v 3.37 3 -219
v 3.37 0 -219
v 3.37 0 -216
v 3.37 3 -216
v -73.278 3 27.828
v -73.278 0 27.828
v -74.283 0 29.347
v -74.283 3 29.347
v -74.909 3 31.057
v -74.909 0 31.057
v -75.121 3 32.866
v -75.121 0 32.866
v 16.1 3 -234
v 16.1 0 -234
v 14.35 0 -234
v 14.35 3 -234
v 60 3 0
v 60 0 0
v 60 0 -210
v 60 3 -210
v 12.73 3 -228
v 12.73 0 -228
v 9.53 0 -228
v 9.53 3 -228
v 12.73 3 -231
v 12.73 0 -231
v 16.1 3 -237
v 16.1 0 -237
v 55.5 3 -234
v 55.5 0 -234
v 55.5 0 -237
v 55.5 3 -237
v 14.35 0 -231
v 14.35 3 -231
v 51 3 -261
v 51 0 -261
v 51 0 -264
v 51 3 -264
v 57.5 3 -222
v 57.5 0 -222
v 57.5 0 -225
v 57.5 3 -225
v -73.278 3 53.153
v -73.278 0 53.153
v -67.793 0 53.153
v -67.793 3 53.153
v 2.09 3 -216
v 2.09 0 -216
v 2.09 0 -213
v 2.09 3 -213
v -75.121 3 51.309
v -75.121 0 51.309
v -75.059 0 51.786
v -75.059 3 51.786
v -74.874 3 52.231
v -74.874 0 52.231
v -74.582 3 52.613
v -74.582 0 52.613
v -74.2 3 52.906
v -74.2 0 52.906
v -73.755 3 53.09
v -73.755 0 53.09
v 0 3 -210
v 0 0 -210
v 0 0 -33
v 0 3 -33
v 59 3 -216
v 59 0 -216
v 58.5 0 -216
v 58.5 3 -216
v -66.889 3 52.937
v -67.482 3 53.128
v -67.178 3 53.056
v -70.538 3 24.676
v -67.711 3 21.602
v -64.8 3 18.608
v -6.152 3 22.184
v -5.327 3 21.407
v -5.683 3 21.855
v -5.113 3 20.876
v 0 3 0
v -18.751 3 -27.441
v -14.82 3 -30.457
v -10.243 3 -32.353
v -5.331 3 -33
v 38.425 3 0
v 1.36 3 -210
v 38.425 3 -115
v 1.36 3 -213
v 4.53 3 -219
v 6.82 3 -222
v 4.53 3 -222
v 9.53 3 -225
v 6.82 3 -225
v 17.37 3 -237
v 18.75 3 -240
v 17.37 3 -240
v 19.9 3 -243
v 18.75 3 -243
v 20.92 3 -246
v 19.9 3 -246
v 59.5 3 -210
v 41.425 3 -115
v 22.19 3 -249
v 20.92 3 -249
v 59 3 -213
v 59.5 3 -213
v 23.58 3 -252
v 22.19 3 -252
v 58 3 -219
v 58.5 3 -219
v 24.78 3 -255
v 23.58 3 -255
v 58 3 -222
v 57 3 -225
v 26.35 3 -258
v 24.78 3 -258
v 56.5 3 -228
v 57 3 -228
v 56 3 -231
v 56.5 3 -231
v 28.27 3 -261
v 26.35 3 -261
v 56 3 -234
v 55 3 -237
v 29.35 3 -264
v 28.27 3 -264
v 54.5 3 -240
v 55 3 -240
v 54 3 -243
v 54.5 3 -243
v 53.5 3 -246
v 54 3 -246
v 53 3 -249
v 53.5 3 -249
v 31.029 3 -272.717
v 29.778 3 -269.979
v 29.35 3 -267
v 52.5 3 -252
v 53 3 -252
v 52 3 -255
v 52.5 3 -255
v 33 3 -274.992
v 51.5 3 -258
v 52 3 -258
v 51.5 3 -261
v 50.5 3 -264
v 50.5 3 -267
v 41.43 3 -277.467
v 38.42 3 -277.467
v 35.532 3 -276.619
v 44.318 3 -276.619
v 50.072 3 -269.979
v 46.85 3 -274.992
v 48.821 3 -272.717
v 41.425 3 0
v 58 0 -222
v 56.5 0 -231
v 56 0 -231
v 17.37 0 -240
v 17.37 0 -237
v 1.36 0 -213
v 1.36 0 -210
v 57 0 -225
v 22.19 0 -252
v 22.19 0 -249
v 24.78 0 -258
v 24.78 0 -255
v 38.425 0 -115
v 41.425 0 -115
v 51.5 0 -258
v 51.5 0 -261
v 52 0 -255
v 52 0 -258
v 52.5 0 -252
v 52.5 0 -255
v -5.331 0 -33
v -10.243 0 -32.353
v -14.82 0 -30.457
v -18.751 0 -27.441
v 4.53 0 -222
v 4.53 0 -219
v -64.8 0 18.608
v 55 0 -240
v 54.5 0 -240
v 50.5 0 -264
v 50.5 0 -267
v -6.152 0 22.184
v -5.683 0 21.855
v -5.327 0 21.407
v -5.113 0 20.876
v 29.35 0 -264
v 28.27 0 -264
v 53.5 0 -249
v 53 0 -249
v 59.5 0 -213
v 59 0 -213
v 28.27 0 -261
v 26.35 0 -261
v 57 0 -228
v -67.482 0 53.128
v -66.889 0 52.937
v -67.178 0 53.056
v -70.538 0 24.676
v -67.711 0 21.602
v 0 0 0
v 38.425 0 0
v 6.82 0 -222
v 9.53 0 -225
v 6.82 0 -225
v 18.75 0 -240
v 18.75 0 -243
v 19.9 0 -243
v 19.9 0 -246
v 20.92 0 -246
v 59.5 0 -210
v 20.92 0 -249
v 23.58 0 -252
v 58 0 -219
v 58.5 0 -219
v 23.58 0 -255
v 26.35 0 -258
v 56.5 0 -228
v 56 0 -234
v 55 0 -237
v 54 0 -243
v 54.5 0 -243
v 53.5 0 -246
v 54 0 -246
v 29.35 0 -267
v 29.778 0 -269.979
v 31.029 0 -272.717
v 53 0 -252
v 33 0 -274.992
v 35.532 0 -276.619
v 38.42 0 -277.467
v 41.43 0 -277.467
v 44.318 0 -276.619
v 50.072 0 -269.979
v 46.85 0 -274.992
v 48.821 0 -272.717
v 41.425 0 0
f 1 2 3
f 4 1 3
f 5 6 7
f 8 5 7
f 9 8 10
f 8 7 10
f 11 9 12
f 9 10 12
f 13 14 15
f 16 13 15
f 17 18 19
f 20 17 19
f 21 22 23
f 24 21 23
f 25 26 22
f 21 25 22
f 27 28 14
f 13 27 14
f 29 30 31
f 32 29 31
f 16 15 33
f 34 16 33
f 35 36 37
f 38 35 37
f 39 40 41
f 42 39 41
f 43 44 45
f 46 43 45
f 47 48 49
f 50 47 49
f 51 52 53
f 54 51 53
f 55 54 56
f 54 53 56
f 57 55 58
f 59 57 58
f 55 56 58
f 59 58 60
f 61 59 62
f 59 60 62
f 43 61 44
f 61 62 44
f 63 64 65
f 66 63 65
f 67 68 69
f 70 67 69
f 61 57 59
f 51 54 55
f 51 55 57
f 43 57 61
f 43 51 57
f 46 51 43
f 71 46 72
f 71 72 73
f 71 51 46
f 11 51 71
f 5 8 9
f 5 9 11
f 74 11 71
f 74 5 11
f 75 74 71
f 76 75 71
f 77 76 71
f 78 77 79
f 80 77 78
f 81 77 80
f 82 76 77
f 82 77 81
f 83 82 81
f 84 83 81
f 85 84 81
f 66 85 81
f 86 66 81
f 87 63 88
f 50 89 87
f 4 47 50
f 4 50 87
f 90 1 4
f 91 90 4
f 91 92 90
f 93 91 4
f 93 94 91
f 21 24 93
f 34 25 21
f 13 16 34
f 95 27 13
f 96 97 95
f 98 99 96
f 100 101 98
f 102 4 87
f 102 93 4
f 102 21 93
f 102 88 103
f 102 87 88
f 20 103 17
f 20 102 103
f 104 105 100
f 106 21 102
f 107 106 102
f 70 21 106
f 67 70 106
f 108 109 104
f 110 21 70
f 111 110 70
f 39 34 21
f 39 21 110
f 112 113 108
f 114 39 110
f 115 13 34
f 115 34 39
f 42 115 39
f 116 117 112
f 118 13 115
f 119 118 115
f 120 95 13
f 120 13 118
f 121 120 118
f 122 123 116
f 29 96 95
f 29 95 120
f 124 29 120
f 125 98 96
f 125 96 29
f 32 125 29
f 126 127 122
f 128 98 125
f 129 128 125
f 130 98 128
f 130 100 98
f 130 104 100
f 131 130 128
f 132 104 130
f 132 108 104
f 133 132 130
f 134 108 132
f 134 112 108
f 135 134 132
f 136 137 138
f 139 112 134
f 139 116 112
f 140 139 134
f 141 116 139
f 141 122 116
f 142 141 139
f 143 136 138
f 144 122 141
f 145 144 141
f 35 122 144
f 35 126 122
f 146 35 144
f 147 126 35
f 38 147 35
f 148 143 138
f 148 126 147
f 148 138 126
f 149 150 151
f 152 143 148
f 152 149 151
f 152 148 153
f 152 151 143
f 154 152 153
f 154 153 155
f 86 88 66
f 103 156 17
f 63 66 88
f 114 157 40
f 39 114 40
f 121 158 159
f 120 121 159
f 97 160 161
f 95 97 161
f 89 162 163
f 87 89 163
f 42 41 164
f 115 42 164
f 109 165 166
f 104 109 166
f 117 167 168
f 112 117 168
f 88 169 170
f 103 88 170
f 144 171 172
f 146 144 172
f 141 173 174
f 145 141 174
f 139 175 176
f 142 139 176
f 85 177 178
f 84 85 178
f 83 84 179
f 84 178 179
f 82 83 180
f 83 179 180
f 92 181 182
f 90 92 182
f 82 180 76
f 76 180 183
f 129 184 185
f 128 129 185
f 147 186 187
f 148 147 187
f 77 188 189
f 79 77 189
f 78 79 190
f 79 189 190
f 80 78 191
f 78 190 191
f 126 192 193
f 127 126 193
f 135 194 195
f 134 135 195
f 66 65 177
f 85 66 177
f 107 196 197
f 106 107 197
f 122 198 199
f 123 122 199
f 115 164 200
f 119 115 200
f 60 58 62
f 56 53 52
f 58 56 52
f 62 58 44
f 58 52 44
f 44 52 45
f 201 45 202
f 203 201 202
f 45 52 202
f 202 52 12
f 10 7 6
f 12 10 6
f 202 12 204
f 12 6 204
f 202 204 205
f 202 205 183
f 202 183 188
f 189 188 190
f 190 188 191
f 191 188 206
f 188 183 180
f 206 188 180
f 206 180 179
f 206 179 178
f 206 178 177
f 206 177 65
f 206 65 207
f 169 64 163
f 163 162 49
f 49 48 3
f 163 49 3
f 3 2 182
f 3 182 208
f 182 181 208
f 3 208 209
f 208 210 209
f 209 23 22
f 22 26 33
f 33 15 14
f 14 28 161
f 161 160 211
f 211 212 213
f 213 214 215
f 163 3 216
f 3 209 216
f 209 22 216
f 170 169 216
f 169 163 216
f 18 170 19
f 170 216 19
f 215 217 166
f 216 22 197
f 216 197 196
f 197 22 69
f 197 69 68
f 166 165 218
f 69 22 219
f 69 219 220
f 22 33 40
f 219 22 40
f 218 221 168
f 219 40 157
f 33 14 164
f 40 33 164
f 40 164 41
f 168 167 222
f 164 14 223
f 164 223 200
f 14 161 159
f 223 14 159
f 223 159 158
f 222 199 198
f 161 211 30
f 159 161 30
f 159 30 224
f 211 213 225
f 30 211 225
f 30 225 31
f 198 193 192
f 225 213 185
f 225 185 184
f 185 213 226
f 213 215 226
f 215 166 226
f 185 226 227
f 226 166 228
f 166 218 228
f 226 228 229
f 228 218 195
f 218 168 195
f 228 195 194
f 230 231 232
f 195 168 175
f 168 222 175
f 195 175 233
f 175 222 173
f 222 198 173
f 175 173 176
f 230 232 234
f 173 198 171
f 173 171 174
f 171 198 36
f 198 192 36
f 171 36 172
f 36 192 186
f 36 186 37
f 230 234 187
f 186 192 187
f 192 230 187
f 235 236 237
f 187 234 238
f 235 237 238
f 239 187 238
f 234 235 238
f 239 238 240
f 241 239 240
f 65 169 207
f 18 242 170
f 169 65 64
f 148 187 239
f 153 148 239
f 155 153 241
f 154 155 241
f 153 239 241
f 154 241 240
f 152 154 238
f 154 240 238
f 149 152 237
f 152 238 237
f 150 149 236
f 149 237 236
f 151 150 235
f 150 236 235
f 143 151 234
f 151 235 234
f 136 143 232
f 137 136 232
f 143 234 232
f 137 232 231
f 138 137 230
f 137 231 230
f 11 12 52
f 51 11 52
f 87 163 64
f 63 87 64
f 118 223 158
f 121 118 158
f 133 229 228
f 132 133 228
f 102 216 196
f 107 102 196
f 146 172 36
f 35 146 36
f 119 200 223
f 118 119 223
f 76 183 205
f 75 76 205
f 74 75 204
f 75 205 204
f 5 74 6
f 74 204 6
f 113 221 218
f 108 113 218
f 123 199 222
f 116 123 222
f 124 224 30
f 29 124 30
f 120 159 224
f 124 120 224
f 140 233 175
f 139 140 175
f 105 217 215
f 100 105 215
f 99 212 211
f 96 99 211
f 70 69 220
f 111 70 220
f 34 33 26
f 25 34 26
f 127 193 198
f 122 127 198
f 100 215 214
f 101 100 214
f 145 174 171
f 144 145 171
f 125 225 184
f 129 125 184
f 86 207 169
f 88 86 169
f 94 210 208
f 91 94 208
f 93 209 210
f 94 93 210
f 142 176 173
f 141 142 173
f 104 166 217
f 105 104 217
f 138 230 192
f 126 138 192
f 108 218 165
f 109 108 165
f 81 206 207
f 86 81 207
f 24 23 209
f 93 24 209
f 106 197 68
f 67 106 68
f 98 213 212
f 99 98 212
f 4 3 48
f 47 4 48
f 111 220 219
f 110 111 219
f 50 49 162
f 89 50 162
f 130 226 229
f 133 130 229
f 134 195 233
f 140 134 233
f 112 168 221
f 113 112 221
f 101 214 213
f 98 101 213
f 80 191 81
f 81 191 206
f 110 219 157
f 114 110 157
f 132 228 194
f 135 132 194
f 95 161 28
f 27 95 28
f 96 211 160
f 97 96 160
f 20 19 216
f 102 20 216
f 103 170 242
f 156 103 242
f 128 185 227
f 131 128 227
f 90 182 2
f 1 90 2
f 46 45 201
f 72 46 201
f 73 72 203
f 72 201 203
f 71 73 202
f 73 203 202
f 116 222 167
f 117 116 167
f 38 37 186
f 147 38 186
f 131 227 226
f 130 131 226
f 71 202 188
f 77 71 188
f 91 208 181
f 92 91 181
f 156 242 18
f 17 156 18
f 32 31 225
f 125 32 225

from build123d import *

# Parameters (mm, degrees)
SALIENTE_EXTRUIR1_DEPTH = 3


with BuildPart() as part:
    # Croquis1 → Saliente-Extruir1 (new body)
    with BuildSketch(Plane(origin=(0, 0, 0), x_dir=(1, 0, 0), z_dir=(0, 1, 0))):
        with BuildLine():
            Line((0, 33), (-5.331406318, 33))
            ThreePointArc((-5.331406318, 33), (-12.593971099, 31.555386046), (-18.750876228, 27.441473563))
            Line((-18.750876228, 27.441473563), (-64.799895827, -18.607546035))
            ThreePointArc((-64.799895827, -18.607546035), (-69.135552051, -23.128851505), (-73.277942785, -27.827863853))
            ThreePointArc((-73.277942785, -27.827863853), (-74.646122538, -30.183582463), (-75.121480816, -32.86599938))
            Line((-75.121480816, -32.86599938), (-75.121480816, -51.309071299))
            ThreePointArc((-75.121480816, -51.309071299), (-74.581521028, -52.612649541), (-73.277942785, -53.152609329))
            Line((-73.277942785, -53.152609329), (-67.7929112, -53.152609329))
            ThreePointArc((-67.7929112, -53.152609329), (-67.328497374, -53.097942153), (-66.88947174, -52.936929127))
            Line((-66.88947174, -52.936929127), (-6.151808223, -22.184144776))
            ThreePointArc((-6.151808223, -22.184144776), (-5.489025915, -21.643589172), (-5.112658875, -20.875586177))
            Line((-5.112658875, -20.875586177), (0, 0))
            Line((0, 0), (38.425, 0))
            Line((38.425, 0), (38.425, 115))
            Line((38.425, 115), (41.425, 115))
            Line((41.425, 115), (41.425, 0))
            Line((41.425, 0), (60, 0))
            Line((60, 0), (60, 210))
            Line((60, 210), (59.5, 210))
            Line((59.5, 210), (59.5, 213))
            Line((59.5, 213), (59, 213))
            Line((59, 213), (59, 216))
            Line((59, 216), (58.5, 216))
            Line((58.5, 216), (58.5, 219))
            Line((58.5, 219), (58, 219))
            Line((58, 219), (58, 222))
            Line((58, 222), (57.5, 222))
            Line((57.5, 222), (57.5, 225))
            Line((57.5, 225), (57, 225))
            Line((57, 225), (57, 228))
            Line((57, 228), (56.5, 228))
            Line((56.5, 228), (56.5, 231))
            Line((56.5, 231), (56, 231))
            Line((56, 231), (56, 234))
            Line((56, 234), (55.5, 234))
            Line((55.5, 234), (55.5, 237))
            Line((55.5, 237), (55, 237))
            Line((55, 237), (55, 240))
            Line((55, 240), (54.5, 240))
            Line((54.5, 240), (54.5, 243))
            Line((54.5, 243), (54, 243))
            Line((54, 243), (54, 246))
            Line((54, 246), (53.5, 246))
            Line((53.5, 246), (53.5, 249))
            Line((53.5, 249), (53, 249))
            Line((53, 249), (53, 252))
            Line((53, 252), (52.5, 252))
            Line((52.5, 252), (52.5, 255))
            Line((52.5, 255), (52, 255))
            Line((52, 255), (52, 258))
            Line((52, 258), (51.5, 258))
            Line((51.5, 258), (51.5, 261))
            Line((51.5, 261), (51, 261))
            Line((51, 261), (51, 264))
            Line((51, 264), (50.5, 264))
            Line((50.5, 264), (50.5, 267))
            ThreePointArc((50.5, 267), (39.925, 277.575), (29.35, 267))
            Line((29.35, 267), (29.35, 264))
            Line((29.35, 264), (28.27, 264))
            Line((28.27, 264), (28.27, 261))
            Line((28.27, 261), (26.35, 261))
            Line((26.35, 261), (26.35, 258))
            Line((26.35, 258), (24.78, 258))
            Line((24.78, 258), (24.78, 255))
            Line((24.78, 255), (23.58, 255))
            Line((23.58, 255), (23.58, 252))
            Line((23.58, 252), (22.19, 252))
            Line((22.19, 252), (22.19, 249))
            Line((22.19, 249), (20.92, 249))
            Line((20.92, 249), (20.92, 246))
            Line((20.92, 246), (19.9, 246))
            Line((19.9, 246), (19.9, 243))
            Line((19.9, 243), (18.75, 243))
            Line((18.75, 243), (18.75, 240))
            Line((18.75, 240), (17.37, 240))
            Line((17.37, 240), (17.37, 237))
            Line((17.37, 237), (16.1, 237))
            Line((16.1, 237), (16.1, 234))
            Line((16.1, 234), (14.35, 234))
            Line((14.35, 234), (14.35, 231))
            Line((14.35, 231), (12.73, 231))
            Line((12.73, 231), (12.73, 228))
            Line((12.73, 228), (9.53, 228))
            Line((9.53, 228), (9.53, 225))
            Line((9.53, 225), (6.82, 225))
            Line((6.82, 225), (6.82, 222))
            Line((6.82, 222), (4.53, 222))
            Line((4.53, 222), (4.53, 219))
            Line((4.53, 219), (3.37, 219))
            Line((3.37, 219), (3.37, 216))
            Line((3.37, 216), (2.09, 216))
            Line((2.09, 216), (2.09, 213))
            Line((2.09, 213), (1.36, 213))
            Line((1.36, 213), (1.36, 210))
            Line((1.36, 210), (0, 210))
            Line((0, 210), (0, 33))
        make_face()
    extrude(amount=SALIENTE_EXTRUIR1_DEPTH)


solid = part.part
